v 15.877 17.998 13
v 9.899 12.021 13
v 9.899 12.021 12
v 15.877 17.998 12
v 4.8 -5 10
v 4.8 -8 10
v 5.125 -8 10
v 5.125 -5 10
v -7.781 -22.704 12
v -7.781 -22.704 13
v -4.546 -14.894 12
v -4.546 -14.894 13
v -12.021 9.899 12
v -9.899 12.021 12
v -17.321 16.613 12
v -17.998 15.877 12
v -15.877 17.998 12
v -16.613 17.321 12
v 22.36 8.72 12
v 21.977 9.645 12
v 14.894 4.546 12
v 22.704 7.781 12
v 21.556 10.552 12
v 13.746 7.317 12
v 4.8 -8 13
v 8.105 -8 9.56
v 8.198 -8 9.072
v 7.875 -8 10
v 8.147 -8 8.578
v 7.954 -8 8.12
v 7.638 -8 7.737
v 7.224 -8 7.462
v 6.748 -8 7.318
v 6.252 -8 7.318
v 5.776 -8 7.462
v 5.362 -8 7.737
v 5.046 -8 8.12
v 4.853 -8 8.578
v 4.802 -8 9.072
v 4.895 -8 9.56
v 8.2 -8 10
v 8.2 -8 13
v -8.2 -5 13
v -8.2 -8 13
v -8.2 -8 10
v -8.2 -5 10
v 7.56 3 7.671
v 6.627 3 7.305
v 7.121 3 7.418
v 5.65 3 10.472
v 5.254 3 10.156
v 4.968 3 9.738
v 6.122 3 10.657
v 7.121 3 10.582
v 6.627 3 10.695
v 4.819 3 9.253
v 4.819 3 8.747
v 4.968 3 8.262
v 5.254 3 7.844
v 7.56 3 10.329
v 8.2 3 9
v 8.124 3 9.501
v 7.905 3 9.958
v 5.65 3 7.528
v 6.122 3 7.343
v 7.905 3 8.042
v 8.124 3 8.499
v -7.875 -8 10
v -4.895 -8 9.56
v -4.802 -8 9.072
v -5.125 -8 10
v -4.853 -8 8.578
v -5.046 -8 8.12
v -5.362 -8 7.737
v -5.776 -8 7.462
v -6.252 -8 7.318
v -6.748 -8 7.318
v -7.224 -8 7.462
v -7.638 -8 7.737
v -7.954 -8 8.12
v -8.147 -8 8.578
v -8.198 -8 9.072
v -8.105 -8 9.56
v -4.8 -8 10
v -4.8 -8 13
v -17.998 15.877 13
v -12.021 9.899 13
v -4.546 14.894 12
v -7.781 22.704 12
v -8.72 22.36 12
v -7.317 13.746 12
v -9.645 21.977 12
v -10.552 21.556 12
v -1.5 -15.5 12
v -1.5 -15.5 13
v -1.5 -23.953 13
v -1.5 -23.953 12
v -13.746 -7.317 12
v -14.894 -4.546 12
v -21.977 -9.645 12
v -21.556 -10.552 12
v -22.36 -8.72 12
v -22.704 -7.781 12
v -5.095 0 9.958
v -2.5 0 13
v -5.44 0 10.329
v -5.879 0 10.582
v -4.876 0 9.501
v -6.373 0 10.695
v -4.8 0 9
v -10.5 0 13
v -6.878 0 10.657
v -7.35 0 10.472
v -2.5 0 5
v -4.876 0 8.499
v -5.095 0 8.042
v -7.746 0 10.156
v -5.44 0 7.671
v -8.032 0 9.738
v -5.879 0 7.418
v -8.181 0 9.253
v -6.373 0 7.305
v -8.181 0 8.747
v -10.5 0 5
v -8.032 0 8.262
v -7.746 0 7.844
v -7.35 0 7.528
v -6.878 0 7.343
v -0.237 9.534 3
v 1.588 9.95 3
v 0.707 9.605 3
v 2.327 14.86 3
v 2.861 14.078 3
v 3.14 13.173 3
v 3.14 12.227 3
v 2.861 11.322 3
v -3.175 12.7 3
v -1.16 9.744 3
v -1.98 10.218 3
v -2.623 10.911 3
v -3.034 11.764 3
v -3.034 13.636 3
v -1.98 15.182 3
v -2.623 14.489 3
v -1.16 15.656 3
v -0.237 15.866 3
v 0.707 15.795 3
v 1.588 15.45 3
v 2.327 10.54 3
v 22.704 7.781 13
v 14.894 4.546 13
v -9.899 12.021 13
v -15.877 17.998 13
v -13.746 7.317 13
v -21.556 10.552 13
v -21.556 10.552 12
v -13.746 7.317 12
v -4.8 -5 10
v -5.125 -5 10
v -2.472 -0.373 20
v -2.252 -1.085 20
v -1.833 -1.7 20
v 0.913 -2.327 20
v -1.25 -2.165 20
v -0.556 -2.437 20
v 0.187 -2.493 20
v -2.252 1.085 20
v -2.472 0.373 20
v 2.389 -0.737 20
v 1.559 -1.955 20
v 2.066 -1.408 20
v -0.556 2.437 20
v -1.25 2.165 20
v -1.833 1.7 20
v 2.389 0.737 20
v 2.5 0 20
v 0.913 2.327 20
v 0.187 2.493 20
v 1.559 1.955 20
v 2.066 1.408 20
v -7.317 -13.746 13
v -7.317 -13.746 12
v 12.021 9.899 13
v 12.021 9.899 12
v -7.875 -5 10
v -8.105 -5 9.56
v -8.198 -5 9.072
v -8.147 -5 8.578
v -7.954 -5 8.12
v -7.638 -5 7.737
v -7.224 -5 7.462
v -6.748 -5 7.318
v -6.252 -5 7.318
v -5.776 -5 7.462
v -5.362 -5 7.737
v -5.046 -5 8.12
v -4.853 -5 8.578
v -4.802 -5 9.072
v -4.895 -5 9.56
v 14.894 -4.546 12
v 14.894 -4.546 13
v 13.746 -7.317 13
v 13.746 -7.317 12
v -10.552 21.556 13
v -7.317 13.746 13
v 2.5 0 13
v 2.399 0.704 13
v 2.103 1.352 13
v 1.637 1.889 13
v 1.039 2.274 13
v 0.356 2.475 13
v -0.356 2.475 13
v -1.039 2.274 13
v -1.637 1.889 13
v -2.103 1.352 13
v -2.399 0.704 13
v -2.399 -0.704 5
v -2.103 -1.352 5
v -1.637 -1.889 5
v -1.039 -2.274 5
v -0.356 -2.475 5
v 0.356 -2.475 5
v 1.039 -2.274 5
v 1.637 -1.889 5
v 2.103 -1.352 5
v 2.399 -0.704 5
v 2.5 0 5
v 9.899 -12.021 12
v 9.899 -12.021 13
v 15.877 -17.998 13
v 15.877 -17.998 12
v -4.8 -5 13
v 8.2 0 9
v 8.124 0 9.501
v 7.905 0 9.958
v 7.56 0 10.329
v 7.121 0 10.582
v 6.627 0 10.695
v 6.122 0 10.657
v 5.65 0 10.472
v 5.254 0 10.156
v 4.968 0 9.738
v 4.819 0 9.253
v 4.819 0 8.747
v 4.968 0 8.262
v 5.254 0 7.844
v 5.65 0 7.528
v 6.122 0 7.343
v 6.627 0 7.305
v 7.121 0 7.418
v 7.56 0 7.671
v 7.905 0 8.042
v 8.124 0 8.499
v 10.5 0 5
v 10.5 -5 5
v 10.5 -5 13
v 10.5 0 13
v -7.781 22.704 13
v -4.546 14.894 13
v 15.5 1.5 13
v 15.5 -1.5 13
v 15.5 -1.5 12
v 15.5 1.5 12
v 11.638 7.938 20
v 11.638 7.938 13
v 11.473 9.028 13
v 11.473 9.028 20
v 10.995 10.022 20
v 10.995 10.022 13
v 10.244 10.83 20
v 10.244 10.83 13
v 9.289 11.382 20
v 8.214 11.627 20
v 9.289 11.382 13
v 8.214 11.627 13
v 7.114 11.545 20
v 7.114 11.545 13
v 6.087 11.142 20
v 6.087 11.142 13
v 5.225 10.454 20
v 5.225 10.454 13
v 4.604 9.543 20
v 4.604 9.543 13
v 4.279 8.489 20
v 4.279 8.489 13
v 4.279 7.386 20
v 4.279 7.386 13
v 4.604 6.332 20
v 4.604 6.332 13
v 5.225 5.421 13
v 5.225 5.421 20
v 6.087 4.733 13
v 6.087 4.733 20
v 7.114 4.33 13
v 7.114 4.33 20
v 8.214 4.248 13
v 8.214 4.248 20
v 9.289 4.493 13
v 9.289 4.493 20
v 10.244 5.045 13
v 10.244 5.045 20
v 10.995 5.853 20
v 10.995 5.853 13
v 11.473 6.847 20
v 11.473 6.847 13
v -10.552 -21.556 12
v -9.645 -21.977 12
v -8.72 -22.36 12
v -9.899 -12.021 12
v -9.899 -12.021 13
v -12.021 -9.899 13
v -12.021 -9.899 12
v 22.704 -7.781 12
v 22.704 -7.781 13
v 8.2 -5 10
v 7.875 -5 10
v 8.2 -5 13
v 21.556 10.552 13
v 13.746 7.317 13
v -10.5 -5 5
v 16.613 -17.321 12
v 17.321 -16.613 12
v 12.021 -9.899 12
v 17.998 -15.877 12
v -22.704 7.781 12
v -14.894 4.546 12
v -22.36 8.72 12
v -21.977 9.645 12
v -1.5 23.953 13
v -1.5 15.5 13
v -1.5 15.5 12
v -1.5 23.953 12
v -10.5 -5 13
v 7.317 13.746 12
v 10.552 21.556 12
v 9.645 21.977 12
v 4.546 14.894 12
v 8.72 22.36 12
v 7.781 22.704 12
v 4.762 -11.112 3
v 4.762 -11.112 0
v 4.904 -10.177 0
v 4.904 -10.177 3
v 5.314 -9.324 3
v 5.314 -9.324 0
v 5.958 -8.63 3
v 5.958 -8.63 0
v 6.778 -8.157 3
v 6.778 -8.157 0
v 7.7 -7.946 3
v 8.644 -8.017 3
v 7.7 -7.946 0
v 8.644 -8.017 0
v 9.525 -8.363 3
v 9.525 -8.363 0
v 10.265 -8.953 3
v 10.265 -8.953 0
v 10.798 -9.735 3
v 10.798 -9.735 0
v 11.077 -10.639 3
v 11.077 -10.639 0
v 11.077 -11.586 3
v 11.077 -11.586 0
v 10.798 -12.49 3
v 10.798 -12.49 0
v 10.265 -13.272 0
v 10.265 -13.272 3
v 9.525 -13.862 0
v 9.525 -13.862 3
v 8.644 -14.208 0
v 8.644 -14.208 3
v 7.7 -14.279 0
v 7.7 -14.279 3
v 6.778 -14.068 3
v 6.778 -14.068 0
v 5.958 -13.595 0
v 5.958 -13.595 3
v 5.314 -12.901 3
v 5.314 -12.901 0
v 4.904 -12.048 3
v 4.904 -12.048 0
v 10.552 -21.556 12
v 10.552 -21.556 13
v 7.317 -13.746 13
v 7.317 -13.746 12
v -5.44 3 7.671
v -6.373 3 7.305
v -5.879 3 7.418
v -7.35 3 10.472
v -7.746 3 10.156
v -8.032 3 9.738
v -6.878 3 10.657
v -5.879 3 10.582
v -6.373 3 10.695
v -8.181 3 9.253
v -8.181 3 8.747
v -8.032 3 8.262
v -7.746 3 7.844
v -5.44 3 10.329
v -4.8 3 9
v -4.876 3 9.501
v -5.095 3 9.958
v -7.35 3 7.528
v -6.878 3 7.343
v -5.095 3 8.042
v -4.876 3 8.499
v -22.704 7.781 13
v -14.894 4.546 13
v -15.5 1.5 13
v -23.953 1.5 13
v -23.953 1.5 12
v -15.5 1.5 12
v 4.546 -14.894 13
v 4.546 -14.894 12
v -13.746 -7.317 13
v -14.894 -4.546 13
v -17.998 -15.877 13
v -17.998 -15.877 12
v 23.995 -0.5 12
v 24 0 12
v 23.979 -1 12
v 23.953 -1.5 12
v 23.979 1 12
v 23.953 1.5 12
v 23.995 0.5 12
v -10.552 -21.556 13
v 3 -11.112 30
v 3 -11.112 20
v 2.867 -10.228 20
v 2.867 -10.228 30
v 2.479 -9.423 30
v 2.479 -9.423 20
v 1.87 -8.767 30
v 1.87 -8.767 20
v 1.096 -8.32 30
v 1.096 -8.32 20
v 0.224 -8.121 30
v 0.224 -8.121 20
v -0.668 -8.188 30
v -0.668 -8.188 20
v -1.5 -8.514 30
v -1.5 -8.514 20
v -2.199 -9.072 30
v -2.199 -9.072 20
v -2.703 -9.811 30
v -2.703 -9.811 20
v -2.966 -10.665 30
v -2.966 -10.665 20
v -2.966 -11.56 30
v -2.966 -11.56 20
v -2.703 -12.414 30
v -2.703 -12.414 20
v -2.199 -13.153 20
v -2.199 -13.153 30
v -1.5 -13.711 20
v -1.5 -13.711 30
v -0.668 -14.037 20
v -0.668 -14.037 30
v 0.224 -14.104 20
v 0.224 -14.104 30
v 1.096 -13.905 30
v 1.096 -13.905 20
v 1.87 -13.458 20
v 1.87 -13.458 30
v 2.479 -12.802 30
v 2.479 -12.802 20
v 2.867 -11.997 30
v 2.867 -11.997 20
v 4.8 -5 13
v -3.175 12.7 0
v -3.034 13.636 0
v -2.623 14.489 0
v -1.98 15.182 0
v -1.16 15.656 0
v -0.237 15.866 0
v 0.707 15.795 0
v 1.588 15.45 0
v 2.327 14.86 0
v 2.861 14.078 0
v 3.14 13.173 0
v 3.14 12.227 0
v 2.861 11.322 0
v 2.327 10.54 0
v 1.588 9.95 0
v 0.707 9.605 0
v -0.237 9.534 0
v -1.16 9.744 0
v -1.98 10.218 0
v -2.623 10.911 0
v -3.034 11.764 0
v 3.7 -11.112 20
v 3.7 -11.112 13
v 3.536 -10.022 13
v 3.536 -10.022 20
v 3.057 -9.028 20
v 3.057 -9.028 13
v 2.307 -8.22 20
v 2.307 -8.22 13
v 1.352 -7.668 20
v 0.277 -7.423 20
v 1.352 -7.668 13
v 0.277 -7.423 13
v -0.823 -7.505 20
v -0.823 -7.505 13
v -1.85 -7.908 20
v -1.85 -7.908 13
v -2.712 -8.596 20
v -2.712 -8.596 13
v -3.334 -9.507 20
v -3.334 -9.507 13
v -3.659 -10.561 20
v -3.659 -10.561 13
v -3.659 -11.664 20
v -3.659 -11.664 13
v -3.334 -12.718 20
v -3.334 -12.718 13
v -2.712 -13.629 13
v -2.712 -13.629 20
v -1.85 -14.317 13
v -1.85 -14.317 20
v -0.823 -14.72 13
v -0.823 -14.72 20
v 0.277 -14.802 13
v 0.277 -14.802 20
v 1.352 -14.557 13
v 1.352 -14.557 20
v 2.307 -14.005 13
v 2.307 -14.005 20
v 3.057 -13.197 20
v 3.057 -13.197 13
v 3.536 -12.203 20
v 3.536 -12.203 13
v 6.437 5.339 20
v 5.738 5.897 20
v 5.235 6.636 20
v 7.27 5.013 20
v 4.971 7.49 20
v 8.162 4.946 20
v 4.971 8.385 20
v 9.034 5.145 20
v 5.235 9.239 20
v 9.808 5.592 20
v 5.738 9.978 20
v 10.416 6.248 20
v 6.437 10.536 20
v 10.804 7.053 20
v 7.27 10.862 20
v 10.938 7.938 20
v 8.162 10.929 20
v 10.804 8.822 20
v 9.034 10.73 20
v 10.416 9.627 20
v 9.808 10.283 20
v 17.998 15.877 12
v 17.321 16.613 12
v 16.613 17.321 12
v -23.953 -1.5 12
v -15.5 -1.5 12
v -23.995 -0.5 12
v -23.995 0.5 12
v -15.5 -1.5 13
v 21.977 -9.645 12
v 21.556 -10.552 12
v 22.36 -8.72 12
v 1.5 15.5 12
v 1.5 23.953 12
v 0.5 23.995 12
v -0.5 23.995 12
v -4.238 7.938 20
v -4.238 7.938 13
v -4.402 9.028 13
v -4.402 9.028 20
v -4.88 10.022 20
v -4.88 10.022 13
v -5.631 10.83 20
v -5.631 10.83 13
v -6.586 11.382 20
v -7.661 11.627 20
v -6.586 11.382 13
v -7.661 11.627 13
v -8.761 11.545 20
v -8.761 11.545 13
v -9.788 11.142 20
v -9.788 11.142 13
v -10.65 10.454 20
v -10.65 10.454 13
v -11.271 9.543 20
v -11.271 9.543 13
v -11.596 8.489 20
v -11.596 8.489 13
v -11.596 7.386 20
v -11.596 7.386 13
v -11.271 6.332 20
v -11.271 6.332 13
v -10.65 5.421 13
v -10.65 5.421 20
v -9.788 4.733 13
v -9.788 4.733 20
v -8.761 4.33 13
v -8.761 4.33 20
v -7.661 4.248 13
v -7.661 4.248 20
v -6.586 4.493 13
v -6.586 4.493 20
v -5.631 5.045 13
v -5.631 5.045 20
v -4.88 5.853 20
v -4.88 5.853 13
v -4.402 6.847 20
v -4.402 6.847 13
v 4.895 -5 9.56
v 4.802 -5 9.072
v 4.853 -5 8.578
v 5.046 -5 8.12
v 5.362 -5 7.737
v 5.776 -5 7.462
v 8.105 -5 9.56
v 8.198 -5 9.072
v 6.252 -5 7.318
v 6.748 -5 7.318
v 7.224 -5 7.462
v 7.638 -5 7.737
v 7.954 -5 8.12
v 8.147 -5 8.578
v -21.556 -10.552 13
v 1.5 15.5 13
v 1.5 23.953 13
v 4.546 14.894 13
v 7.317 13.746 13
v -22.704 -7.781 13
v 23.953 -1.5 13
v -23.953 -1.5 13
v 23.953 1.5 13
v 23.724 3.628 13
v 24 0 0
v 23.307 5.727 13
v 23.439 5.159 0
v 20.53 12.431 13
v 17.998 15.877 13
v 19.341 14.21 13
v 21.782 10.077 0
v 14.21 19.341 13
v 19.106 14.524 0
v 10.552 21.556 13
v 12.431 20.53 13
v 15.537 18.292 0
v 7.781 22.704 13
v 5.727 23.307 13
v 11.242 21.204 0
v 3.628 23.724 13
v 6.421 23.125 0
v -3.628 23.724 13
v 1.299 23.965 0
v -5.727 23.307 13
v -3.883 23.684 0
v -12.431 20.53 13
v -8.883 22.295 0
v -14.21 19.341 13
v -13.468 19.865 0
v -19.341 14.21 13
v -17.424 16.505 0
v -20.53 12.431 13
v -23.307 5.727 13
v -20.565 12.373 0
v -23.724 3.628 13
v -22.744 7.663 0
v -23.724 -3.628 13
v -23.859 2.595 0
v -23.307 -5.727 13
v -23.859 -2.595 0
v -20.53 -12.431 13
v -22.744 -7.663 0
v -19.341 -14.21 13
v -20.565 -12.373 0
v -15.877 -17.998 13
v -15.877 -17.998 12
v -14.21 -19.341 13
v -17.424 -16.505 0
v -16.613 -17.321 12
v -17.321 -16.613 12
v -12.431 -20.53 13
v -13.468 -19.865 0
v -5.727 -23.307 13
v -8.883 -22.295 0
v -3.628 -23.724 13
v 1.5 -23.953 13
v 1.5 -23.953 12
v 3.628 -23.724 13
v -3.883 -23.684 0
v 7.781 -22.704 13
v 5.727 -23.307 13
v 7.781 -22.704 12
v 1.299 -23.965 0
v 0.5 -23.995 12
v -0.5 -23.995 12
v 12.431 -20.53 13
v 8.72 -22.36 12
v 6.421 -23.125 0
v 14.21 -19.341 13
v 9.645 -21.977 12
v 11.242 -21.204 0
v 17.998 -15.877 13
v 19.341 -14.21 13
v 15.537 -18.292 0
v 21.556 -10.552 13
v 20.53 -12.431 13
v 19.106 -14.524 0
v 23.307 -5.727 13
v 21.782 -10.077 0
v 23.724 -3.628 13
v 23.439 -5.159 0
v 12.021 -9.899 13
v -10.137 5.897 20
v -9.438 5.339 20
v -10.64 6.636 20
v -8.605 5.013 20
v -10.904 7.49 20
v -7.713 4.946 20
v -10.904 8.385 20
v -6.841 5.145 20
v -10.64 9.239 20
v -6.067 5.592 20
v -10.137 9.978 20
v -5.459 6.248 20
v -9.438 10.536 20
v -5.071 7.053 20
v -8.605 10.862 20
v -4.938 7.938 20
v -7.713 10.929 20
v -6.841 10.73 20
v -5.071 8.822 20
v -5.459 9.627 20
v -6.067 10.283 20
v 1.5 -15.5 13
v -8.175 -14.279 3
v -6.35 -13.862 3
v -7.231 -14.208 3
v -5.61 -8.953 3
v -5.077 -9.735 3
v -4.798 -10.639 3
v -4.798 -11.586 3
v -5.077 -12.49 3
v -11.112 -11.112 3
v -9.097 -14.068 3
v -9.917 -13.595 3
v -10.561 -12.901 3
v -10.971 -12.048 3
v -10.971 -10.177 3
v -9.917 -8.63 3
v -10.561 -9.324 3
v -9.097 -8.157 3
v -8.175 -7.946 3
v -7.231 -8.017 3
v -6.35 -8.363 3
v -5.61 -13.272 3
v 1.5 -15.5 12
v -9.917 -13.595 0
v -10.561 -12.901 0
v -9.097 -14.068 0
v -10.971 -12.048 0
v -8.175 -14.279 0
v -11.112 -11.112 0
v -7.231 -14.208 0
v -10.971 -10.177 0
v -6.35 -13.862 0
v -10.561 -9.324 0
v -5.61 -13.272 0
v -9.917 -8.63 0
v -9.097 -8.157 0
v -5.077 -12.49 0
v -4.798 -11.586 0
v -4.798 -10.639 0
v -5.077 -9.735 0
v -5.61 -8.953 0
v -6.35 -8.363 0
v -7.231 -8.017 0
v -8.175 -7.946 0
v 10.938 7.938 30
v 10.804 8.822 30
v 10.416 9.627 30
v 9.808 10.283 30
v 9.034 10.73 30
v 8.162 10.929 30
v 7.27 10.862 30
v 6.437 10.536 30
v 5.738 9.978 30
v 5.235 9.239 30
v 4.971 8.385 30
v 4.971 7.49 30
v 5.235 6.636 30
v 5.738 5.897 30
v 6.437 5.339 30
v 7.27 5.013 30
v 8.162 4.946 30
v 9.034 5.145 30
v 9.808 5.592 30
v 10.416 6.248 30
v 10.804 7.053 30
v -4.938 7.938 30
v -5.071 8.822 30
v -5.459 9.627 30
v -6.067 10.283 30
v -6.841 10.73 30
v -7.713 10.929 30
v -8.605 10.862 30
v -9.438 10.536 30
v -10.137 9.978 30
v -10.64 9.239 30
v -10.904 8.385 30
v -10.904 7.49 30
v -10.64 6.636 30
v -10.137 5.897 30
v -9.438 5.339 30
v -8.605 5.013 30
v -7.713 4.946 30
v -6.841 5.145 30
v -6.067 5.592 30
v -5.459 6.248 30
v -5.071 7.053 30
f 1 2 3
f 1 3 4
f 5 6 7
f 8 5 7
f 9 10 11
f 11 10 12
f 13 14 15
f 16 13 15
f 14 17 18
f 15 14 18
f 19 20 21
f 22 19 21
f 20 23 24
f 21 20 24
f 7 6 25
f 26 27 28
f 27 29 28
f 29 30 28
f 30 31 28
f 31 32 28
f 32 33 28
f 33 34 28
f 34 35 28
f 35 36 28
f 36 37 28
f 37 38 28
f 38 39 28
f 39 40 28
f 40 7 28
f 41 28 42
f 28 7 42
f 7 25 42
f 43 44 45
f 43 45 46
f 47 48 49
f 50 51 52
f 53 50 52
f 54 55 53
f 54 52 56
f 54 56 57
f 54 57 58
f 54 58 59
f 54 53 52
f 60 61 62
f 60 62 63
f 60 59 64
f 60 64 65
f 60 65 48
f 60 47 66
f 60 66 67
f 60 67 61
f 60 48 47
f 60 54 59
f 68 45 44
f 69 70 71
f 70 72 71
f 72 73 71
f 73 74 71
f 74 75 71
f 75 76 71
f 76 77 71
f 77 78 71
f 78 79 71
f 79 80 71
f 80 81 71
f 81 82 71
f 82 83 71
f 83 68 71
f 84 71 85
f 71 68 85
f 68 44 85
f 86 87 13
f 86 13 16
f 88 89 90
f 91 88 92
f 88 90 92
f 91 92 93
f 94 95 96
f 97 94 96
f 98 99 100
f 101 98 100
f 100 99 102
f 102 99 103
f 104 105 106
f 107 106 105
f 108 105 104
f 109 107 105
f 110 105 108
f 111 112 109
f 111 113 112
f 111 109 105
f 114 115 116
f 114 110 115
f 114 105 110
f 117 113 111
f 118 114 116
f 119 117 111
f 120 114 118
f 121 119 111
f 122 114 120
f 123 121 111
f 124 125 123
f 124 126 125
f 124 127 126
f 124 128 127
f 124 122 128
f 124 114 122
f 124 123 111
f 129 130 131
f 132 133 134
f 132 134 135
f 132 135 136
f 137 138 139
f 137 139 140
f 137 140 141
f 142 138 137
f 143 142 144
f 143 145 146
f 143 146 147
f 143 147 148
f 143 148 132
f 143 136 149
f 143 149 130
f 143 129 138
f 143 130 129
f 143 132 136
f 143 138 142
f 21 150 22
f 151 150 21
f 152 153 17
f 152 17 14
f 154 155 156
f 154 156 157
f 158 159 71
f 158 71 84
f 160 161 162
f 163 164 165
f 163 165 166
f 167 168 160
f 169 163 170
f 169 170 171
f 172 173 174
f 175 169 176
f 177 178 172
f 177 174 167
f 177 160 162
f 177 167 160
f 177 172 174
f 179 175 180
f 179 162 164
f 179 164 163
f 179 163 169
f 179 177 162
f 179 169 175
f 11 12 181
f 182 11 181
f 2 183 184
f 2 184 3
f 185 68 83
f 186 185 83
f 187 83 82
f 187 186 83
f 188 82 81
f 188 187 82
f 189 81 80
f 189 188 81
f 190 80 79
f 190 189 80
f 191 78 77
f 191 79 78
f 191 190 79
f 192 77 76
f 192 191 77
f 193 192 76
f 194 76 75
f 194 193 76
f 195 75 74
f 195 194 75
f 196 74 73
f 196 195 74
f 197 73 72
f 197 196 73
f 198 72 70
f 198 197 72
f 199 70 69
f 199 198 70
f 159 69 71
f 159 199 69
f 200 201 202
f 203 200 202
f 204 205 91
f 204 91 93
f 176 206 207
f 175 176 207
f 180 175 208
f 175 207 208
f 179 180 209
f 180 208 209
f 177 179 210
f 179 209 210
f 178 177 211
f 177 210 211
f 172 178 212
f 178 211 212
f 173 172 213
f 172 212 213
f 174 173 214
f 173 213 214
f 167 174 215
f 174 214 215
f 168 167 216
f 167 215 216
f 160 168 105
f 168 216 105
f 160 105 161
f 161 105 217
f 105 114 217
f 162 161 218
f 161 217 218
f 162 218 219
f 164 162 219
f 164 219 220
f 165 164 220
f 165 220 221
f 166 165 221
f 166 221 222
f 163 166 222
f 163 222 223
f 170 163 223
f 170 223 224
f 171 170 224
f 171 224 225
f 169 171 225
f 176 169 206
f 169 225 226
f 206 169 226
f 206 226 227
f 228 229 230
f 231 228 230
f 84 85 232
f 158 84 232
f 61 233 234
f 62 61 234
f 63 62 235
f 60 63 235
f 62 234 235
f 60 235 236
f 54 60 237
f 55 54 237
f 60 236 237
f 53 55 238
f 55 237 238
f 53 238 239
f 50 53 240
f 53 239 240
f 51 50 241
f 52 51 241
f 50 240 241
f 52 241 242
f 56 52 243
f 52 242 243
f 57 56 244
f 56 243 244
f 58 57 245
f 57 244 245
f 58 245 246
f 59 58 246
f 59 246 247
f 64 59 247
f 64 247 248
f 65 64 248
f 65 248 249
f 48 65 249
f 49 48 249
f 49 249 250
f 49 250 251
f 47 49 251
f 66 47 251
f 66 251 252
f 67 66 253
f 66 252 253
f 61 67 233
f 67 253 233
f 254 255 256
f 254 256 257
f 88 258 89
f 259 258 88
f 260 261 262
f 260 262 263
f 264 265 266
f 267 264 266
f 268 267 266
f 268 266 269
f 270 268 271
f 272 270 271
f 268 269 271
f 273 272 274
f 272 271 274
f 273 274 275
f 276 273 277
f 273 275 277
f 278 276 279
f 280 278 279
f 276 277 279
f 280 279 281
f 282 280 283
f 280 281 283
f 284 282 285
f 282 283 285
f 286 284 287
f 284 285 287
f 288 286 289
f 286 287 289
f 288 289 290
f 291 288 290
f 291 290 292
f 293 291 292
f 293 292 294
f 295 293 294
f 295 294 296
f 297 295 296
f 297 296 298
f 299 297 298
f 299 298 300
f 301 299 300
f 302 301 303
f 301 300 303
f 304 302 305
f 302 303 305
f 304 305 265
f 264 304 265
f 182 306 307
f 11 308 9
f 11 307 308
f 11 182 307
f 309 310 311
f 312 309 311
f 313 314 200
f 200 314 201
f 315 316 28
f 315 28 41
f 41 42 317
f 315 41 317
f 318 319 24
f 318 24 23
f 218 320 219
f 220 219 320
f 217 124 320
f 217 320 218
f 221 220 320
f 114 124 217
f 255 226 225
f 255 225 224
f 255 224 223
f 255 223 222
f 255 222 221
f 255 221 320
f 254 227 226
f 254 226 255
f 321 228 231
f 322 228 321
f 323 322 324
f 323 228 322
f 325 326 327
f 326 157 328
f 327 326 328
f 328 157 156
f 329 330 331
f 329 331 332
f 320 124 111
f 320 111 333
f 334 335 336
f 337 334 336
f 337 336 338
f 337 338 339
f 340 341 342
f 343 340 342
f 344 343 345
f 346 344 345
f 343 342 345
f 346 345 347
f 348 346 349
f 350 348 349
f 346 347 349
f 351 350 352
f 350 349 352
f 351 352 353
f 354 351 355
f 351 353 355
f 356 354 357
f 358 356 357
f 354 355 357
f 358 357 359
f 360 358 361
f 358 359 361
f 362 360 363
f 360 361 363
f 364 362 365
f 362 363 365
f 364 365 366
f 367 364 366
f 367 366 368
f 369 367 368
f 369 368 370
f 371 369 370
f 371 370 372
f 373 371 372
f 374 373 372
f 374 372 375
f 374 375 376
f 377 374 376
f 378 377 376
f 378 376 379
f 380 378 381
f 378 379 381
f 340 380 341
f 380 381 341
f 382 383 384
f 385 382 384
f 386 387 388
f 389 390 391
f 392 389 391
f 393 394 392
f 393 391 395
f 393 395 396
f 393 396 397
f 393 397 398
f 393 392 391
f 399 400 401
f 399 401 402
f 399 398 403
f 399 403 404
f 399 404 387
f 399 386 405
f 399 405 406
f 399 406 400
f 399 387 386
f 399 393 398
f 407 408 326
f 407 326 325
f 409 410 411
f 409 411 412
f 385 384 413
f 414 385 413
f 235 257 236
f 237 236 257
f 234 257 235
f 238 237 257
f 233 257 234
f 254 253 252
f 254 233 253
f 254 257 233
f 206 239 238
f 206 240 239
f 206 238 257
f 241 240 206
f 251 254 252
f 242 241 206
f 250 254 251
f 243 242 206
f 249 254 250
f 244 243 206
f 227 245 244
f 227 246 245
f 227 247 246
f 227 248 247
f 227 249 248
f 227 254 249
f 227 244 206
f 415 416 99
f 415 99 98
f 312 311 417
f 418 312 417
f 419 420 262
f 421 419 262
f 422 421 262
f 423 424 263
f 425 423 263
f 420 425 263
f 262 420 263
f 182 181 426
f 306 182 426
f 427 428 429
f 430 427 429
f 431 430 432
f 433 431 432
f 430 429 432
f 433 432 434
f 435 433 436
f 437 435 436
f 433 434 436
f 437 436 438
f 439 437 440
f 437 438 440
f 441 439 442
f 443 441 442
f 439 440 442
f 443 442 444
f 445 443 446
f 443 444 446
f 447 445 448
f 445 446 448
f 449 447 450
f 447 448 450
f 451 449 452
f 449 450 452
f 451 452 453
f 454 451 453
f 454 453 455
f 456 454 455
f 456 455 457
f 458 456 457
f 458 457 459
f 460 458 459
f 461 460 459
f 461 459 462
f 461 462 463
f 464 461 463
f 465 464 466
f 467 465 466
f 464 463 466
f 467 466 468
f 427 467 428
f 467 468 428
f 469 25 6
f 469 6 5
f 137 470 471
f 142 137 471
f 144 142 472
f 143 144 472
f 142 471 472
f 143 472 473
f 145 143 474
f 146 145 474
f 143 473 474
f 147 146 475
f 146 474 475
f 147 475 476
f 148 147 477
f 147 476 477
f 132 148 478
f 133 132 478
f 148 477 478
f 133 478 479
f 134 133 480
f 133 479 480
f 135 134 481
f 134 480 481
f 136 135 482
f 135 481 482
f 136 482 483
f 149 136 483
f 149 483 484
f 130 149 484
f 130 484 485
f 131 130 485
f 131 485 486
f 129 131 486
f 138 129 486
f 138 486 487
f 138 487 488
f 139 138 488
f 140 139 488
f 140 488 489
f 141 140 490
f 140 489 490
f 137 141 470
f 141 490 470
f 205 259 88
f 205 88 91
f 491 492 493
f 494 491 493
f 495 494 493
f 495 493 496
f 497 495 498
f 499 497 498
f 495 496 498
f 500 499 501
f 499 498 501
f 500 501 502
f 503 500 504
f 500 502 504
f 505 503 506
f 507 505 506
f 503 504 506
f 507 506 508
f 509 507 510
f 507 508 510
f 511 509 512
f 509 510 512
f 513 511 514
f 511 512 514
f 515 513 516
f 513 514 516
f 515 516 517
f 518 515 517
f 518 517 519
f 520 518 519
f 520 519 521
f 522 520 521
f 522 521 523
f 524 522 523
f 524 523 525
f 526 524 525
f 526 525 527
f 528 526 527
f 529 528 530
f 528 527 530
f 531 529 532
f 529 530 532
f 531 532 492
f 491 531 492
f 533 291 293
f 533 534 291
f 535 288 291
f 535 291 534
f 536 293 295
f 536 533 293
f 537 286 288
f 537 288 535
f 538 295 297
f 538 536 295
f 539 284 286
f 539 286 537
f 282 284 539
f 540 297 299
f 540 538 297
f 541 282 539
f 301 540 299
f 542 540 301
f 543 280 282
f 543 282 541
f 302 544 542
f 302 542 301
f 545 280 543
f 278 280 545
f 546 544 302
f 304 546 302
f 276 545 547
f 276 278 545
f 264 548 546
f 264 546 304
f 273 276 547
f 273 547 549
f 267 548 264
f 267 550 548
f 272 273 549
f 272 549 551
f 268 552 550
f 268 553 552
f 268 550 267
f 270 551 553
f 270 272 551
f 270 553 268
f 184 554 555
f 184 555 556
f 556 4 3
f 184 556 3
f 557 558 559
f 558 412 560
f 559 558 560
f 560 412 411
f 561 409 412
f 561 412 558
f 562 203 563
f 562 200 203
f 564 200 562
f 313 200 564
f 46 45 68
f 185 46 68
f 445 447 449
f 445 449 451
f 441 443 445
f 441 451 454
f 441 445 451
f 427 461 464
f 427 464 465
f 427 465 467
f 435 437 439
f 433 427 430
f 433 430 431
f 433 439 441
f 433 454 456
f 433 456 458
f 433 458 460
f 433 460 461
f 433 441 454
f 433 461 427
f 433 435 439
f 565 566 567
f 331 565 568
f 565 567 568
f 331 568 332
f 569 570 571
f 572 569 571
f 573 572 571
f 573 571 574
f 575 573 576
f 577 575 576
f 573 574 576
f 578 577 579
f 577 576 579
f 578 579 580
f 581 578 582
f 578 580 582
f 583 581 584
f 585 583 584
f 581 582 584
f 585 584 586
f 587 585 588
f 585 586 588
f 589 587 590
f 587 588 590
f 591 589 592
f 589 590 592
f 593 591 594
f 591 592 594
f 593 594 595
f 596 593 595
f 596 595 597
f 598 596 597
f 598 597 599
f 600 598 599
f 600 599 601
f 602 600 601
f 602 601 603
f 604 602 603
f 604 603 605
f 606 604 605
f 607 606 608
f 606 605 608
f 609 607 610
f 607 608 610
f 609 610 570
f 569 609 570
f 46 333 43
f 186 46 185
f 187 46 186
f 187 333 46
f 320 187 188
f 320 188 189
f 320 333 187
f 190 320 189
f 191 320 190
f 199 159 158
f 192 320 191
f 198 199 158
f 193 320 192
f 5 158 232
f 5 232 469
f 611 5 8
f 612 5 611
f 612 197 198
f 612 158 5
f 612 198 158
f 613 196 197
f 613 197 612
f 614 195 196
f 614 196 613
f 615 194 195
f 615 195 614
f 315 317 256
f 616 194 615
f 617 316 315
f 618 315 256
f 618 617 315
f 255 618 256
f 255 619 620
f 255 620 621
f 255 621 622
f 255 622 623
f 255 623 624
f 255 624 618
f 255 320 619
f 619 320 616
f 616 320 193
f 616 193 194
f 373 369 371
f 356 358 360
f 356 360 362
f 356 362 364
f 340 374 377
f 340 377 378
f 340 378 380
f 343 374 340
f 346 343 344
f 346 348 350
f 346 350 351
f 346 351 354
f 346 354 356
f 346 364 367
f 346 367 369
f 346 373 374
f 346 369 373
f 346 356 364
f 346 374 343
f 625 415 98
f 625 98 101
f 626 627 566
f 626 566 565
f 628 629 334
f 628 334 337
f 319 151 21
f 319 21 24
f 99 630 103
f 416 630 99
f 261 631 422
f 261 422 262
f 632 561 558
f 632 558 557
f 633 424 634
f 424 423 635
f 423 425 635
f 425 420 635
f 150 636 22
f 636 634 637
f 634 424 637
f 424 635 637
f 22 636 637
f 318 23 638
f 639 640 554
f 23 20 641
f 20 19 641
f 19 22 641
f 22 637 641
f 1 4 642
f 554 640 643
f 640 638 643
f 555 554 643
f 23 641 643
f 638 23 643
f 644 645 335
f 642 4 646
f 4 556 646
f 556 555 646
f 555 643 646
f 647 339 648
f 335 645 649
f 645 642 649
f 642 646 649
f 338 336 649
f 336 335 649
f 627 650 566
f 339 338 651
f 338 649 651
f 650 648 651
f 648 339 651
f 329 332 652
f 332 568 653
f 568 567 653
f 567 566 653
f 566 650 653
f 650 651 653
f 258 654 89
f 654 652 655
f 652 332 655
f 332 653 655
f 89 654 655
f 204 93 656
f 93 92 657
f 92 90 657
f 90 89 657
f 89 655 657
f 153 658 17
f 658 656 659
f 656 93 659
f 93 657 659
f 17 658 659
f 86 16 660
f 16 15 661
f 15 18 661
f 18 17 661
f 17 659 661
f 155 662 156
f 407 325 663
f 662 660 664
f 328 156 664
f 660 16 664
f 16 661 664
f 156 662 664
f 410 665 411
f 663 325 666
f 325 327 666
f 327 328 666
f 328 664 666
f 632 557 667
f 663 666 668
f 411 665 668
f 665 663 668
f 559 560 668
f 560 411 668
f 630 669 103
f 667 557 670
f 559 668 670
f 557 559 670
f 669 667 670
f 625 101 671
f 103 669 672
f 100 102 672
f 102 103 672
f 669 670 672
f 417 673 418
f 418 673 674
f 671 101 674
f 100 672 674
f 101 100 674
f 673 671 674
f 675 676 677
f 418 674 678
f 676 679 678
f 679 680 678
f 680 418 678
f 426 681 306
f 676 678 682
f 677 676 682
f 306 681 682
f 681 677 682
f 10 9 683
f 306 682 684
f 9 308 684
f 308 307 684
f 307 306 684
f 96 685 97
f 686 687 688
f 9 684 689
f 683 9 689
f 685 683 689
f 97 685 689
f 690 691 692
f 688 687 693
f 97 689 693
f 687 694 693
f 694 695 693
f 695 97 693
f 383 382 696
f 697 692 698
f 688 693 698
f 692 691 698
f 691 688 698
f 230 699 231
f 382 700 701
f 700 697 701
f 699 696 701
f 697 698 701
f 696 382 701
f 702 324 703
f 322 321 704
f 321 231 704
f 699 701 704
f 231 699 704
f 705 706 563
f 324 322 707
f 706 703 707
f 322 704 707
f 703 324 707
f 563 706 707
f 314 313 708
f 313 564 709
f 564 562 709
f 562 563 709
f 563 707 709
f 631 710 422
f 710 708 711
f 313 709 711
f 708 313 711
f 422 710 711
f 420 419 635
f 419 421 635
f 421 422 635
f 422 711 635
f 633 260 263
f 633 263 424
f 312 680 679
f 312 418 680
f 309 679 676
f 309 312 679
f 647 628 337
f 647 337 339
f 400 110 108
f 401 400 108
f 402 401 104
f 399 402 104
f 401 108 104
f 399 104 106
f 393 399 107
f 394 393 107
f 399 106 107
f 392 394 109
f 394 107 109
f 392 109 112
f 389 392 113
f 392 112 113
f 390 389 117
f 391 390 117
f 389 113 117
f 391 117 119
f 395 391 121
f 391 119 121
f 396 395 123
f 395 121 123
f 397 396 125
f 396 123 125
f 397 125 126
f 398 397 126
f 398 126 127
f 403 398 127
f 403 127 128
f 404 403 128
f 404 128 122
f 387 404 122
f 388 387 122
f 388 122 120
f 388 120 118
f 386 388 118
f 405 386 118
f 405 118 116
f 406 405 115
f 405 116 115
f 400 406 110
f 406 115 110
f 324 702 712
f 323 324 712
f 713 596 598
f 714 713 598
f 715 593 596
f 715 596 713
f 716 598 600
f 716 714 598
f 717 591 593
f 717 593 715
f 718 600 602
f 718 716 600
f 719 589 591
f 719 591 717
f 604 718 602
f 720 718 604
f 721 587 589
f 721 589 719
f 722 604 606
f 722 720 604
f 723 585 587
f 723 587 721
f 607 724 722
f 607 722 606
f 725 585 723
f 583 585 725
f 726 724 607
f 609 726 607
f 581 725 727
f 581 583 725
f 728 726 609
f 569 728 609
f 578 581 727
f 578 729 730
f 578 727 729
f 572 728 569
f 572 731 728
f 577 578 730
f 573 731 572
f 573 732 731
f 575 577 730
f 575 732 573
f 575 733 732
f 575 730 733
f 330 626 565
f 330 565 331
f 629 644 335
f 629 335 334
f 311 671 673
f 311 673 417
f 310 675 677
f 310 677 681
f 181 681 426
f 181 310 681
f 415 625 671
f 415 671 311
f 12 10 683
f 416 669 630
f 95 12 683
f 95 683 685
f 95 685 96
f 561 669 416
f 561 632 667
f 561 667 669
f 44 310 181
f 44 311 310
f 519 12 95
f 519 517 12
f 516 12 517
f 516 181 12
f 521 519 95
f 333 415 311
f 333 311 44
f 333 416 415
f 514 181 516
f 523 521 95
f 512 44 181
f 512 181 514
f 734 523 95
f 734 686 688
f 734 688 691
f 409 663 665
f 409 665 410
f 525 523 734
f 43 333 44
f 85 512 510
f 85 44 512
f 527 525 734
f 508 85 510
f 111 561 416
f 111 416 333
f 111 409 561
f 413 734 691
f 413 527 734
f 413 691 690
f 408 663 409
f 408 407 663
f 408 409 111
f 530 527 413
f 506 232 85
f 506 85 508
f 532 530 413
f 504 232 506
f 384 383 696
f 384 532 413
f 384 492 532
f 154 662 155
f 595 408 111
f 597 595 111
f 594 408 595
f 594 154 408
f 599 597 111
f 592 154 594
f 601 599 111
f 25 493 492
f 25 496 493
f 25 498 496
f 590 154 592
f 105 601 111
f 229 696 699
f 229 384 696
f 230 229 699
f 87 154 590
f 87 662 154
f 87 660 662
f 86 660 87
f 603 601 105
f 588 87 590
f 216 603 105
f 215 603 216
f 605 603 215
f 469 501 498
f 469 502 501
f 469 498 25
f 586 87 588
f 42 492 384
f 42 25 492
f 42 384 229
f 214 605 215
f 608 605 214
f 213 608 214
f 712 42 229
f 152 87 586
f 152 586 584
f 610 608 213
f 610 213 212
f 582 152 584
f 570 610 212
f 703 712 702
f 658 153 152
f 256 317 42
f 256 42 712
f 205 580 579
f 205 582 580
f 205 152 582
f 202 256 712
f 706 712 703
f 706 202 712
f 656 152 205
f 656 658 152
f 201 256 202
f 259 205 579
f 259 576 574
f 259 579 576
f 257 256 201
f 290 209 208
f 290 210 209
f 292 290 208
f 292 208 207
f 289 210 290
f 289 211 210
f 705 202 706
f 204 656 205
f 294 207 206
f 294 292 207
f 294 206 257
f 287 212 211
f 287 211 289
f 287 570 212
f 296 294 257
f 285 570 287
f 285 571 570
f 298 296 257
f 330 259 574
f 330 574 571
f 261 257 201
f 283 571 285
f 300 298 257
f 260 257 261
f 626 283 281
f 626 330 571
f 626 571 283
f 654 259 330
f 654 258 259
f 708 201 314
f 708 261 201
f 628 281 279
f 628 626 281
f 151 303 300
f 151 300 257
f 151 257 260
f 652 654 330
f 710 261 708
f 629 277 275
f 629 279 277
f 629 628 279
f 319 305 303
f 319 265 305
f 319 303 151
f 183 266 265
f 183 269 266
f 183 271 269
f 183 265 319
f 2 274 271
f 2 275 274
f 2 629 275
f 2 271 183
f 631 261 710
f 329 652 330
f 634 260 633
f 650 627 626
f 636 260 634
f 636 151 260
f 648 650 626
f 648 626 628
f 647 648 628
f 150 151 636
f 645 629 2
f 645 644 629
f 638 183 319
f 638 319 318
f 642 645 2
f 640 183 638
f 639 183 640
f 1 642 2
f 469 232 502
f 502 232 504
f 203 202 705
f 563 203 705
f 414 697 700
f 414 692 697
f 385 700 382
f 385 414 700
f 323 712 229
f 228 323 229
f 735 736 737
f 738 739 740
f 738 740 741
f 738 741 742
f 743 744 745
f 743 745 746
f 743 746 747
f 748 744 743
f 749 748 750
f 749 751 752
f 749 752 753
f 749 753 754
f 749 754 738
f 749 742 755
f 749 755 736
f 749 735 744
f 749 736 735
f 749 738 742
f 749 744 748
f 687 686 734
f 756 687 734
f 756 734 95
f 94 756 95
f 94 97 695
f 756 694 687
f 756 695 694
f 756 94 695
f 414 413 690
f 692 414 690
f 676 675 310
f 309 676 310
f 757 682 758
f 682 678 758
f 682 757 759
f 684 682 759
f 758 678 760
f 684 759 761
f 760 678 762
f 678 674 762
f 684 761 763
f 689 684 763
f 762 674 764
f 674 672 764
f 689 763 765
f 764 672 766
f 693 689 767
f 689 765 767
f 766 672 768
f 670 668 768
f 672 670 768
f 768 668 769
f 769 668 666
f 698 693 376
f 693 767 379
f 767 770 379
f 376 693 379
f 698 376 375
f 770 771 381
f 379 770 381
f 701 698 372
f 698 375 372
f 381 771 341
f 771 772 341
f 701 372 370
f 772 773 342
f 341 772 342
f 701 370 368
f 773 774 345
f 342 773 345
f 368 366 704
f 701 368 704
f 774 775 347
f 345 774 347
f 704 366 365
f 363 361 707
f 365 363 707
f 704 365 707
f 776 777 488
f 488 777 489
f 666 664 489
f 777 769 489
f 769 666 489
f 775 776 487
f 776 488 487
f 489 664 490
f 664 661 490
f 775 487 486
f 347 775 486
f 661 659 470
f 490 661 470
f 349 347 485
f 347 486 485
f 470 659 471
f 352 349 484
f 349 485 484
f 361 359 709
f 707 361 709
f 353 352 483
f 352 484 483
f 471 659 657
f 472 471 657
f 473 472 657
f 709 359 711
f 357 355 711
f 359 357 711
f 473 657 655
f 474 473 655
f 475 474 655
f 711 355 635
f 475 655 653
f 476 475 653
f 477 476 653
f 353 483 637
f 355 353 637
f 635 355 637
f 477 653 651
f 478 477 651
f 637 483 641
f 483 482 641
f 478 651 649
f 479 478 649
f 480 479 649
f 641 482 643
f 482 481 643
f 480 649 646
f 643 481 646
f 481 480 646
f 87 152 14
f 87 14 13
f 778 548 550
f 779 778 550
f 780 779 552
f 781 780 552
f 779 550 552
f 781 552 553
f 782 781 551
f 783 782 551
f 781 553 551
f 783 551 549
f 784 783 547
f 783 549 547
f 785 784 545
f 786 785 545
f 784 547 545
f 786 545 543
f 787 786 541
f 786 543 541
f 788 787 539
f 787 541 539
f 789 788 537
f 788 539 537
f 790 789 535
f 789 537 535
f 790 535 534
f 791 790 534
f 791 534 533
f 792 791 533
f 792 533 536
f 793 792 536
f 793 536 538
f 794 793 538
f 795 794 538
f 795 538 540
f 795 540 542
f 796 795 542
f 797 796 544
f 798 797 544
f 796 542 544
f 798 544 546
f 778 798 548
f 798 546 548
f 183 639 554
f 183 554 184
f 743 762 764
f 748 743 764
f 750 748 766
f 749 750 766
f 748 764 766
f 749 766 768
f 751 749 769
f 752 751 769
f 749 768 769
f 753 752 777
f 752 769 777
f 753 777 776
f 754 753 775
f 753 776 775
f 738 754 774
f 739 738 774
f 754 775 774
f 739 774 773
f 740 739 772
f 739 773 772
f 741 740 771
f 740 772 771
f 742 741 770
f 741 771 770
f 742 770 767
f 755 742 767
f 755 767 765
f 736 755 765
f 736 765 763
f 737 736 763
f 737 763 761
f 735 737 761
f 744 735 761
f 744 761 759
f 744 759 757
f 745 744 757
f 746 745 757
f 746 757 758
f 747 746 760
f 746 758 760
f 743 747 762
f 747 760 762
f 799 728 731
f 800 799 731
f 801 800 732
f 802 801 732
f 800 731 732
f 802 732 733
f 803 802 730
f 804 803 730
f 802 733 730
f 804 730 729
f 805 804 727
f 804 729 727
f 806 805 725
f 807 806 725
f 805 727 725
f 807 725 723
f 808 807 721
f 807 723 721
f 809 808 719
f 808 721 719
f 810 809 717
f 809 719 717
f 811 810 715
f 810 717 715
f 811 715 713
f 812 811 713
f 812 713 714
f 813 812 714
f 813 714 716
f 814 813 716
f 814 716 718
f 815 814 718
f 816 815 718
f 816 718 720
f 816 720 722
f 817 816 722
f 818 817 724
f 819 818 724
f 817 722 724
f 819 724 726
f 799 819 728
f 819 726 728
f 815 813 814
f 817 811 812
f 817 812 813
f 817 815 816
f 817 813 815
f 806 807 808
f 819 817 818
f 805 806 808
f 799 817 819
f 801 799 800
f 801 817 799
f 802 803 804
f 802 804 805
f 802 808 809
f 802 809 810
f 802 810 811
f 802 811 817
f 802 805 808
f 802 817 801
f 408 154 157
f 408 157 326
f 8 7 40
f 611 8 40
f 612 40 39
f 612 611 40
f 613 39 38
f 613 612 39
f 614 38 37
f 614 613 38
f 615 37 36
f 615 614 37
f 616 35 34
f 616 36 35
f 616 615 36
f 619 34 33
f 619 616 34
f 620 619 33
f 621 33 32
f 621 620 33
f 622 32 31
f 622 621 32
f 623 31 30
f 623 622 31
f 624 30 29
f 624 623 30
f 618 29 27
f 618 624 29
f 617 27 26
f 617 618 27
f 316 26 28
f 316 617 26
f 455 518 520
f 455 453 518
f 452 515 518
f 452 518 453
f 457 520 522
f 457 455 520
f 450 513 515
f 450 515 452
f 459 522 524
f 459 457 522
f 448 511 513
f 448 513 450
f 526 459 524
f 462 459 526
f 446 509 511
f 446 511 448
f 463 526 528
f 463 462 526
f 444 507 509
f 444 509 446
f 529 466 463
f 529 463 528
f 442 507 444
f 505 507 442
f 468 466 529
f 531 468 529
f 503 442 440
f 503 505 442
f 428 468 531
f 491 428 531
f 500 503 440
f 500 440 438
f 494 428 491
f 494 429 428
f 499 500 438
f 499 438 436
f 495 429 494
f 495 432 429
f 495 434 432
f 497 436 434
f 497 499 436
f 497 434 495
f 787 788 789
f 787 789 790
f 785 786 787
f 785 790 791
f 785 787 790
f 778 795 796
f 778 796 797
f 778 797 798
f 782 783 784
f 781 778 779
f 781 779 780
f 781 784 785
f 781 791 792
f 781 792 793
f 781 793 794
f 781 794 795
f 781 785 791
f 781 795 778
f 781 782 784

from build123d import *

# Parameters (mm, degrees)
SKETCH1_R           = 24
EXTRUDE1_DEPTH      = 5
SKETCH2_R           = 24
EXTRUDE2_DEPTH      = 8
SKETCH3_R           = 2.5
SKETCH3_R_2         = 3.7
EXTRUDE3_DEPTH      = 7
SKETCH5_R           = 3
EXTRUDE6_DEPTH      = 10
SKETCH6_R           = 3.175
EXTRUDE7_DEPTH      = 3
SKETCH7_R           = 1.7
EXTRUDE8_DEPTH      = 8
EXTRUDE8_DEPTH_BACK = 3
SKETCH8_W           = 3.4
SKETCH8_H           = 3
EXTRUDE9_DEPTH      = 3
EXTRUDE10_DEPTH     = 1


with BuildPart() as part:
    # Sketch1 → Extrude1 (new body)
    with BuildSketch(Plane.XY):
        Circle(SKETCH1_R)
    extrude(amount=EXTRUDE1_DEPTH)

    # Sketch2 → Extrude2 (add)
    with BuildSketch(Plane.XY.offset(5)):
        Circle(SKETCH2_R)
        with BuildLine():
            Line((-2.5, 0), (-10.5, 0))
            Line((-10.5, 0), (-10.5, -5))
            Line((-10.5, -5), (10.5, -5))
            Line((10.5, -5), (10.5, 0))
            Line((10.5, 0), (2.5, 0))
            ThreePointArc((2.5, 0), (0, -2.5), (-2.5, 0))
        make_face(mode=Mode.SUBTRACT)
    extrude(amount=EXTRUDE2_DEPTH)

    # Sketch3 → Extrude3 (add)
    with BuildSketch(Plane.XY.offset(13)):
        Circle(SKETCH3_R)
        with Locations((-7.9375, 7.9375)):
            Circle(SKETCH3_R_2)
        with Locations((7.9375, 7.9375)):
            Circle(SKETCH3_R_2)
        with Locations((0, -11.1125)):
            Circle(SKETCH3_R_2)
    extrude(amount=EXTRUDE3_DEPTH)

    # Sketch5 → Extrude6 (add)
    with BuildSketch(Plane.XY.offset(20)):
        with Locations((-7.9375, 7.9375)):
            Circle(SKETCH5_R)
        with Locations((7.9375, 7.9375)):
            Circle(SKETCH5_R)
        with Locations((0, -11.1125)):
            Circle(SKETCH5_R)
    extrude(amount=EXTRUDE6_DEPTH)

    # Sketch6 → Extrude7 (cut)
    with BuildSketch(Plane(origin=(0, 0, 0), x_dir=(-1, 0, 0), z_dir=(0, 0, -1))):
        with Locations((0, 12.7)):
            Circle(SKETCH6_R)
        with Locations((7.9375, -11.1125)):
            Circle(SKETCH6_R)
        with Locations((-7.9375, -11.1125)):
            Circle(SKETCH6_R)
    extrude(amount=-EXTRUDE7_DEPTH, mode=Mode.SUBTRACT)

    # Sketch7 → Extrude8 (cut, two sides)
    with BuildSketch(Plane.XZ) as extrude8_sk:
        with Locations((-6.5, 9)):
            Circle(SKETCH7_R)
        with Locations((6.5, 9)):
            Circle(SKETCH7_R)
    extrude(amount=EXTRUDE8_DEPTH, mode=Mode.SUBTRACT)
    extrude(extrude8_sk.sketch, amount=-EXTRUDE8_DEPTH_BACK, mode=Mode.SUBTRACT)

    # Sketch8 → Extrude9 (cut)
    with BuildSketch(Plane.XY.offset(13)):
        with Locations((-6.5, -6.5)):
            Rectangle(SKETCH8_W, SKETCH8_H)
        with Locations((6.5, -6.5)):
            Rectangle(SKETCH8_W, SKETCH8_H)
    extrude(amount=-EXTRUDE9_DEPTH, mode=Mode.SUBTRACT)

    # Sketch9 → Extrude10 (cut)
    with BuildSketch(Plane.XY.offset(13)):
        Polygon((24, 0), (24, -1.5), (15.5, -1.5), (15.5, 1.5), (24, 1.5), align=None)
        Polygon((22.17310878, 9.184402377), (22.747133929, 7.798583078), (14.894157902, 4.545773903), (13.746107605, 7.3174125), (21.599083632, 10.570221676), align=None)
        Polygon((16.970562748, 16.970562748), (18.03122292, 15.909902577), (12.02081528, 9.899494937), (9.899494937, 12.02081528), (15.909902577, 18.03122292), align=None)
        Polygon((9.184402377, 22.17310878), (10.570221676, 21.599083632), (7.3174125, 13.746107605), (4.545773903, 14.894157902), (7.798583078, 22.747133929), align=None)
        Polygon((0, 24), (1.5, 24), (1.5, 15.5), (-1.5, 15.5), (-1.5, 24), align=None)
        Polygon((-9.184402377, 22.17310878), (-7.798583078, 22.747133929), (-4.545773903, 14.894157902), (-7.3174125, 13.746107605), (-10.570221676, 21.599083632), align=None)
        Polygon((-16.970562748, 16.970562748), (-15.909902577, 18.03122292), (-9.899494937, 12.02081528), (-12.02081528, 9.899494937), (-18.03122292, 15.909902577), align=None)
        Polygon((-22.17310878, 9.184402377), (-21.599083632, 10.570221676), (-13.746107605, 7.3174125), (-14.894157902, 4.545773903), (-22.747133929, 7.798583078), align=None)
        Polygon((-24, 0), (-24, 1.5), (-15.5, 1.5), (-15.5, -1.5), (-24, -1.5), align=None)
        Polygon((-22.17310878, -9.184402377), (-22.747133929, -7.798583078), (-14.894157902, -4.545773903), (-13.746107605, -7.3174125), (-21.599083632, -10.570221676), align=None)
        Polygon((-16.970562748, -16.970562748), (-15.909902577, -18.03122292), (-9.899494937, -12.02081528), (-12.02081528, -9.899494937), (-18.03122292, -15.909902577), align=None)
        Polygon((-9.184402377, -22.17310878), (-7.798583078, -22.747133929), (-4.545773903, -14.894157902), (-7.3174125, -13.746107605), (-10.570221676, -21.599083632), align=None)
        Polygon((0, -24), (1.5, -24), (1.5, -15.5), (-1.5, -15.5), (-1.5, -24), align=None)
        Polygon((9.184402377, -22.17310878), (10.570221676, -21.599083632), (7.3174125, -13.746107605), (4.545773903, -14.894157902), (7.798583078, -22.747133929), align=None)
        Polygon((16.970562748, -16.970562748), (18.03122292, -15.909902577), (12.02081528, -9.899494937), (9.899494937, -12.02081528), (15.909902577, -18.03122292), align=None)
        Polygon((22.17310878, -9.184402377), (22.747133929, -7.798583078), (14.894157902, -4.545773903), (13.746107605, -7.3174125), (21.599083632, -10.570221676), align=None)
    extrude(amount=-EXTRUDE10_DEPTH, mode=Mode.SUBTRACT)


solid = part.part
